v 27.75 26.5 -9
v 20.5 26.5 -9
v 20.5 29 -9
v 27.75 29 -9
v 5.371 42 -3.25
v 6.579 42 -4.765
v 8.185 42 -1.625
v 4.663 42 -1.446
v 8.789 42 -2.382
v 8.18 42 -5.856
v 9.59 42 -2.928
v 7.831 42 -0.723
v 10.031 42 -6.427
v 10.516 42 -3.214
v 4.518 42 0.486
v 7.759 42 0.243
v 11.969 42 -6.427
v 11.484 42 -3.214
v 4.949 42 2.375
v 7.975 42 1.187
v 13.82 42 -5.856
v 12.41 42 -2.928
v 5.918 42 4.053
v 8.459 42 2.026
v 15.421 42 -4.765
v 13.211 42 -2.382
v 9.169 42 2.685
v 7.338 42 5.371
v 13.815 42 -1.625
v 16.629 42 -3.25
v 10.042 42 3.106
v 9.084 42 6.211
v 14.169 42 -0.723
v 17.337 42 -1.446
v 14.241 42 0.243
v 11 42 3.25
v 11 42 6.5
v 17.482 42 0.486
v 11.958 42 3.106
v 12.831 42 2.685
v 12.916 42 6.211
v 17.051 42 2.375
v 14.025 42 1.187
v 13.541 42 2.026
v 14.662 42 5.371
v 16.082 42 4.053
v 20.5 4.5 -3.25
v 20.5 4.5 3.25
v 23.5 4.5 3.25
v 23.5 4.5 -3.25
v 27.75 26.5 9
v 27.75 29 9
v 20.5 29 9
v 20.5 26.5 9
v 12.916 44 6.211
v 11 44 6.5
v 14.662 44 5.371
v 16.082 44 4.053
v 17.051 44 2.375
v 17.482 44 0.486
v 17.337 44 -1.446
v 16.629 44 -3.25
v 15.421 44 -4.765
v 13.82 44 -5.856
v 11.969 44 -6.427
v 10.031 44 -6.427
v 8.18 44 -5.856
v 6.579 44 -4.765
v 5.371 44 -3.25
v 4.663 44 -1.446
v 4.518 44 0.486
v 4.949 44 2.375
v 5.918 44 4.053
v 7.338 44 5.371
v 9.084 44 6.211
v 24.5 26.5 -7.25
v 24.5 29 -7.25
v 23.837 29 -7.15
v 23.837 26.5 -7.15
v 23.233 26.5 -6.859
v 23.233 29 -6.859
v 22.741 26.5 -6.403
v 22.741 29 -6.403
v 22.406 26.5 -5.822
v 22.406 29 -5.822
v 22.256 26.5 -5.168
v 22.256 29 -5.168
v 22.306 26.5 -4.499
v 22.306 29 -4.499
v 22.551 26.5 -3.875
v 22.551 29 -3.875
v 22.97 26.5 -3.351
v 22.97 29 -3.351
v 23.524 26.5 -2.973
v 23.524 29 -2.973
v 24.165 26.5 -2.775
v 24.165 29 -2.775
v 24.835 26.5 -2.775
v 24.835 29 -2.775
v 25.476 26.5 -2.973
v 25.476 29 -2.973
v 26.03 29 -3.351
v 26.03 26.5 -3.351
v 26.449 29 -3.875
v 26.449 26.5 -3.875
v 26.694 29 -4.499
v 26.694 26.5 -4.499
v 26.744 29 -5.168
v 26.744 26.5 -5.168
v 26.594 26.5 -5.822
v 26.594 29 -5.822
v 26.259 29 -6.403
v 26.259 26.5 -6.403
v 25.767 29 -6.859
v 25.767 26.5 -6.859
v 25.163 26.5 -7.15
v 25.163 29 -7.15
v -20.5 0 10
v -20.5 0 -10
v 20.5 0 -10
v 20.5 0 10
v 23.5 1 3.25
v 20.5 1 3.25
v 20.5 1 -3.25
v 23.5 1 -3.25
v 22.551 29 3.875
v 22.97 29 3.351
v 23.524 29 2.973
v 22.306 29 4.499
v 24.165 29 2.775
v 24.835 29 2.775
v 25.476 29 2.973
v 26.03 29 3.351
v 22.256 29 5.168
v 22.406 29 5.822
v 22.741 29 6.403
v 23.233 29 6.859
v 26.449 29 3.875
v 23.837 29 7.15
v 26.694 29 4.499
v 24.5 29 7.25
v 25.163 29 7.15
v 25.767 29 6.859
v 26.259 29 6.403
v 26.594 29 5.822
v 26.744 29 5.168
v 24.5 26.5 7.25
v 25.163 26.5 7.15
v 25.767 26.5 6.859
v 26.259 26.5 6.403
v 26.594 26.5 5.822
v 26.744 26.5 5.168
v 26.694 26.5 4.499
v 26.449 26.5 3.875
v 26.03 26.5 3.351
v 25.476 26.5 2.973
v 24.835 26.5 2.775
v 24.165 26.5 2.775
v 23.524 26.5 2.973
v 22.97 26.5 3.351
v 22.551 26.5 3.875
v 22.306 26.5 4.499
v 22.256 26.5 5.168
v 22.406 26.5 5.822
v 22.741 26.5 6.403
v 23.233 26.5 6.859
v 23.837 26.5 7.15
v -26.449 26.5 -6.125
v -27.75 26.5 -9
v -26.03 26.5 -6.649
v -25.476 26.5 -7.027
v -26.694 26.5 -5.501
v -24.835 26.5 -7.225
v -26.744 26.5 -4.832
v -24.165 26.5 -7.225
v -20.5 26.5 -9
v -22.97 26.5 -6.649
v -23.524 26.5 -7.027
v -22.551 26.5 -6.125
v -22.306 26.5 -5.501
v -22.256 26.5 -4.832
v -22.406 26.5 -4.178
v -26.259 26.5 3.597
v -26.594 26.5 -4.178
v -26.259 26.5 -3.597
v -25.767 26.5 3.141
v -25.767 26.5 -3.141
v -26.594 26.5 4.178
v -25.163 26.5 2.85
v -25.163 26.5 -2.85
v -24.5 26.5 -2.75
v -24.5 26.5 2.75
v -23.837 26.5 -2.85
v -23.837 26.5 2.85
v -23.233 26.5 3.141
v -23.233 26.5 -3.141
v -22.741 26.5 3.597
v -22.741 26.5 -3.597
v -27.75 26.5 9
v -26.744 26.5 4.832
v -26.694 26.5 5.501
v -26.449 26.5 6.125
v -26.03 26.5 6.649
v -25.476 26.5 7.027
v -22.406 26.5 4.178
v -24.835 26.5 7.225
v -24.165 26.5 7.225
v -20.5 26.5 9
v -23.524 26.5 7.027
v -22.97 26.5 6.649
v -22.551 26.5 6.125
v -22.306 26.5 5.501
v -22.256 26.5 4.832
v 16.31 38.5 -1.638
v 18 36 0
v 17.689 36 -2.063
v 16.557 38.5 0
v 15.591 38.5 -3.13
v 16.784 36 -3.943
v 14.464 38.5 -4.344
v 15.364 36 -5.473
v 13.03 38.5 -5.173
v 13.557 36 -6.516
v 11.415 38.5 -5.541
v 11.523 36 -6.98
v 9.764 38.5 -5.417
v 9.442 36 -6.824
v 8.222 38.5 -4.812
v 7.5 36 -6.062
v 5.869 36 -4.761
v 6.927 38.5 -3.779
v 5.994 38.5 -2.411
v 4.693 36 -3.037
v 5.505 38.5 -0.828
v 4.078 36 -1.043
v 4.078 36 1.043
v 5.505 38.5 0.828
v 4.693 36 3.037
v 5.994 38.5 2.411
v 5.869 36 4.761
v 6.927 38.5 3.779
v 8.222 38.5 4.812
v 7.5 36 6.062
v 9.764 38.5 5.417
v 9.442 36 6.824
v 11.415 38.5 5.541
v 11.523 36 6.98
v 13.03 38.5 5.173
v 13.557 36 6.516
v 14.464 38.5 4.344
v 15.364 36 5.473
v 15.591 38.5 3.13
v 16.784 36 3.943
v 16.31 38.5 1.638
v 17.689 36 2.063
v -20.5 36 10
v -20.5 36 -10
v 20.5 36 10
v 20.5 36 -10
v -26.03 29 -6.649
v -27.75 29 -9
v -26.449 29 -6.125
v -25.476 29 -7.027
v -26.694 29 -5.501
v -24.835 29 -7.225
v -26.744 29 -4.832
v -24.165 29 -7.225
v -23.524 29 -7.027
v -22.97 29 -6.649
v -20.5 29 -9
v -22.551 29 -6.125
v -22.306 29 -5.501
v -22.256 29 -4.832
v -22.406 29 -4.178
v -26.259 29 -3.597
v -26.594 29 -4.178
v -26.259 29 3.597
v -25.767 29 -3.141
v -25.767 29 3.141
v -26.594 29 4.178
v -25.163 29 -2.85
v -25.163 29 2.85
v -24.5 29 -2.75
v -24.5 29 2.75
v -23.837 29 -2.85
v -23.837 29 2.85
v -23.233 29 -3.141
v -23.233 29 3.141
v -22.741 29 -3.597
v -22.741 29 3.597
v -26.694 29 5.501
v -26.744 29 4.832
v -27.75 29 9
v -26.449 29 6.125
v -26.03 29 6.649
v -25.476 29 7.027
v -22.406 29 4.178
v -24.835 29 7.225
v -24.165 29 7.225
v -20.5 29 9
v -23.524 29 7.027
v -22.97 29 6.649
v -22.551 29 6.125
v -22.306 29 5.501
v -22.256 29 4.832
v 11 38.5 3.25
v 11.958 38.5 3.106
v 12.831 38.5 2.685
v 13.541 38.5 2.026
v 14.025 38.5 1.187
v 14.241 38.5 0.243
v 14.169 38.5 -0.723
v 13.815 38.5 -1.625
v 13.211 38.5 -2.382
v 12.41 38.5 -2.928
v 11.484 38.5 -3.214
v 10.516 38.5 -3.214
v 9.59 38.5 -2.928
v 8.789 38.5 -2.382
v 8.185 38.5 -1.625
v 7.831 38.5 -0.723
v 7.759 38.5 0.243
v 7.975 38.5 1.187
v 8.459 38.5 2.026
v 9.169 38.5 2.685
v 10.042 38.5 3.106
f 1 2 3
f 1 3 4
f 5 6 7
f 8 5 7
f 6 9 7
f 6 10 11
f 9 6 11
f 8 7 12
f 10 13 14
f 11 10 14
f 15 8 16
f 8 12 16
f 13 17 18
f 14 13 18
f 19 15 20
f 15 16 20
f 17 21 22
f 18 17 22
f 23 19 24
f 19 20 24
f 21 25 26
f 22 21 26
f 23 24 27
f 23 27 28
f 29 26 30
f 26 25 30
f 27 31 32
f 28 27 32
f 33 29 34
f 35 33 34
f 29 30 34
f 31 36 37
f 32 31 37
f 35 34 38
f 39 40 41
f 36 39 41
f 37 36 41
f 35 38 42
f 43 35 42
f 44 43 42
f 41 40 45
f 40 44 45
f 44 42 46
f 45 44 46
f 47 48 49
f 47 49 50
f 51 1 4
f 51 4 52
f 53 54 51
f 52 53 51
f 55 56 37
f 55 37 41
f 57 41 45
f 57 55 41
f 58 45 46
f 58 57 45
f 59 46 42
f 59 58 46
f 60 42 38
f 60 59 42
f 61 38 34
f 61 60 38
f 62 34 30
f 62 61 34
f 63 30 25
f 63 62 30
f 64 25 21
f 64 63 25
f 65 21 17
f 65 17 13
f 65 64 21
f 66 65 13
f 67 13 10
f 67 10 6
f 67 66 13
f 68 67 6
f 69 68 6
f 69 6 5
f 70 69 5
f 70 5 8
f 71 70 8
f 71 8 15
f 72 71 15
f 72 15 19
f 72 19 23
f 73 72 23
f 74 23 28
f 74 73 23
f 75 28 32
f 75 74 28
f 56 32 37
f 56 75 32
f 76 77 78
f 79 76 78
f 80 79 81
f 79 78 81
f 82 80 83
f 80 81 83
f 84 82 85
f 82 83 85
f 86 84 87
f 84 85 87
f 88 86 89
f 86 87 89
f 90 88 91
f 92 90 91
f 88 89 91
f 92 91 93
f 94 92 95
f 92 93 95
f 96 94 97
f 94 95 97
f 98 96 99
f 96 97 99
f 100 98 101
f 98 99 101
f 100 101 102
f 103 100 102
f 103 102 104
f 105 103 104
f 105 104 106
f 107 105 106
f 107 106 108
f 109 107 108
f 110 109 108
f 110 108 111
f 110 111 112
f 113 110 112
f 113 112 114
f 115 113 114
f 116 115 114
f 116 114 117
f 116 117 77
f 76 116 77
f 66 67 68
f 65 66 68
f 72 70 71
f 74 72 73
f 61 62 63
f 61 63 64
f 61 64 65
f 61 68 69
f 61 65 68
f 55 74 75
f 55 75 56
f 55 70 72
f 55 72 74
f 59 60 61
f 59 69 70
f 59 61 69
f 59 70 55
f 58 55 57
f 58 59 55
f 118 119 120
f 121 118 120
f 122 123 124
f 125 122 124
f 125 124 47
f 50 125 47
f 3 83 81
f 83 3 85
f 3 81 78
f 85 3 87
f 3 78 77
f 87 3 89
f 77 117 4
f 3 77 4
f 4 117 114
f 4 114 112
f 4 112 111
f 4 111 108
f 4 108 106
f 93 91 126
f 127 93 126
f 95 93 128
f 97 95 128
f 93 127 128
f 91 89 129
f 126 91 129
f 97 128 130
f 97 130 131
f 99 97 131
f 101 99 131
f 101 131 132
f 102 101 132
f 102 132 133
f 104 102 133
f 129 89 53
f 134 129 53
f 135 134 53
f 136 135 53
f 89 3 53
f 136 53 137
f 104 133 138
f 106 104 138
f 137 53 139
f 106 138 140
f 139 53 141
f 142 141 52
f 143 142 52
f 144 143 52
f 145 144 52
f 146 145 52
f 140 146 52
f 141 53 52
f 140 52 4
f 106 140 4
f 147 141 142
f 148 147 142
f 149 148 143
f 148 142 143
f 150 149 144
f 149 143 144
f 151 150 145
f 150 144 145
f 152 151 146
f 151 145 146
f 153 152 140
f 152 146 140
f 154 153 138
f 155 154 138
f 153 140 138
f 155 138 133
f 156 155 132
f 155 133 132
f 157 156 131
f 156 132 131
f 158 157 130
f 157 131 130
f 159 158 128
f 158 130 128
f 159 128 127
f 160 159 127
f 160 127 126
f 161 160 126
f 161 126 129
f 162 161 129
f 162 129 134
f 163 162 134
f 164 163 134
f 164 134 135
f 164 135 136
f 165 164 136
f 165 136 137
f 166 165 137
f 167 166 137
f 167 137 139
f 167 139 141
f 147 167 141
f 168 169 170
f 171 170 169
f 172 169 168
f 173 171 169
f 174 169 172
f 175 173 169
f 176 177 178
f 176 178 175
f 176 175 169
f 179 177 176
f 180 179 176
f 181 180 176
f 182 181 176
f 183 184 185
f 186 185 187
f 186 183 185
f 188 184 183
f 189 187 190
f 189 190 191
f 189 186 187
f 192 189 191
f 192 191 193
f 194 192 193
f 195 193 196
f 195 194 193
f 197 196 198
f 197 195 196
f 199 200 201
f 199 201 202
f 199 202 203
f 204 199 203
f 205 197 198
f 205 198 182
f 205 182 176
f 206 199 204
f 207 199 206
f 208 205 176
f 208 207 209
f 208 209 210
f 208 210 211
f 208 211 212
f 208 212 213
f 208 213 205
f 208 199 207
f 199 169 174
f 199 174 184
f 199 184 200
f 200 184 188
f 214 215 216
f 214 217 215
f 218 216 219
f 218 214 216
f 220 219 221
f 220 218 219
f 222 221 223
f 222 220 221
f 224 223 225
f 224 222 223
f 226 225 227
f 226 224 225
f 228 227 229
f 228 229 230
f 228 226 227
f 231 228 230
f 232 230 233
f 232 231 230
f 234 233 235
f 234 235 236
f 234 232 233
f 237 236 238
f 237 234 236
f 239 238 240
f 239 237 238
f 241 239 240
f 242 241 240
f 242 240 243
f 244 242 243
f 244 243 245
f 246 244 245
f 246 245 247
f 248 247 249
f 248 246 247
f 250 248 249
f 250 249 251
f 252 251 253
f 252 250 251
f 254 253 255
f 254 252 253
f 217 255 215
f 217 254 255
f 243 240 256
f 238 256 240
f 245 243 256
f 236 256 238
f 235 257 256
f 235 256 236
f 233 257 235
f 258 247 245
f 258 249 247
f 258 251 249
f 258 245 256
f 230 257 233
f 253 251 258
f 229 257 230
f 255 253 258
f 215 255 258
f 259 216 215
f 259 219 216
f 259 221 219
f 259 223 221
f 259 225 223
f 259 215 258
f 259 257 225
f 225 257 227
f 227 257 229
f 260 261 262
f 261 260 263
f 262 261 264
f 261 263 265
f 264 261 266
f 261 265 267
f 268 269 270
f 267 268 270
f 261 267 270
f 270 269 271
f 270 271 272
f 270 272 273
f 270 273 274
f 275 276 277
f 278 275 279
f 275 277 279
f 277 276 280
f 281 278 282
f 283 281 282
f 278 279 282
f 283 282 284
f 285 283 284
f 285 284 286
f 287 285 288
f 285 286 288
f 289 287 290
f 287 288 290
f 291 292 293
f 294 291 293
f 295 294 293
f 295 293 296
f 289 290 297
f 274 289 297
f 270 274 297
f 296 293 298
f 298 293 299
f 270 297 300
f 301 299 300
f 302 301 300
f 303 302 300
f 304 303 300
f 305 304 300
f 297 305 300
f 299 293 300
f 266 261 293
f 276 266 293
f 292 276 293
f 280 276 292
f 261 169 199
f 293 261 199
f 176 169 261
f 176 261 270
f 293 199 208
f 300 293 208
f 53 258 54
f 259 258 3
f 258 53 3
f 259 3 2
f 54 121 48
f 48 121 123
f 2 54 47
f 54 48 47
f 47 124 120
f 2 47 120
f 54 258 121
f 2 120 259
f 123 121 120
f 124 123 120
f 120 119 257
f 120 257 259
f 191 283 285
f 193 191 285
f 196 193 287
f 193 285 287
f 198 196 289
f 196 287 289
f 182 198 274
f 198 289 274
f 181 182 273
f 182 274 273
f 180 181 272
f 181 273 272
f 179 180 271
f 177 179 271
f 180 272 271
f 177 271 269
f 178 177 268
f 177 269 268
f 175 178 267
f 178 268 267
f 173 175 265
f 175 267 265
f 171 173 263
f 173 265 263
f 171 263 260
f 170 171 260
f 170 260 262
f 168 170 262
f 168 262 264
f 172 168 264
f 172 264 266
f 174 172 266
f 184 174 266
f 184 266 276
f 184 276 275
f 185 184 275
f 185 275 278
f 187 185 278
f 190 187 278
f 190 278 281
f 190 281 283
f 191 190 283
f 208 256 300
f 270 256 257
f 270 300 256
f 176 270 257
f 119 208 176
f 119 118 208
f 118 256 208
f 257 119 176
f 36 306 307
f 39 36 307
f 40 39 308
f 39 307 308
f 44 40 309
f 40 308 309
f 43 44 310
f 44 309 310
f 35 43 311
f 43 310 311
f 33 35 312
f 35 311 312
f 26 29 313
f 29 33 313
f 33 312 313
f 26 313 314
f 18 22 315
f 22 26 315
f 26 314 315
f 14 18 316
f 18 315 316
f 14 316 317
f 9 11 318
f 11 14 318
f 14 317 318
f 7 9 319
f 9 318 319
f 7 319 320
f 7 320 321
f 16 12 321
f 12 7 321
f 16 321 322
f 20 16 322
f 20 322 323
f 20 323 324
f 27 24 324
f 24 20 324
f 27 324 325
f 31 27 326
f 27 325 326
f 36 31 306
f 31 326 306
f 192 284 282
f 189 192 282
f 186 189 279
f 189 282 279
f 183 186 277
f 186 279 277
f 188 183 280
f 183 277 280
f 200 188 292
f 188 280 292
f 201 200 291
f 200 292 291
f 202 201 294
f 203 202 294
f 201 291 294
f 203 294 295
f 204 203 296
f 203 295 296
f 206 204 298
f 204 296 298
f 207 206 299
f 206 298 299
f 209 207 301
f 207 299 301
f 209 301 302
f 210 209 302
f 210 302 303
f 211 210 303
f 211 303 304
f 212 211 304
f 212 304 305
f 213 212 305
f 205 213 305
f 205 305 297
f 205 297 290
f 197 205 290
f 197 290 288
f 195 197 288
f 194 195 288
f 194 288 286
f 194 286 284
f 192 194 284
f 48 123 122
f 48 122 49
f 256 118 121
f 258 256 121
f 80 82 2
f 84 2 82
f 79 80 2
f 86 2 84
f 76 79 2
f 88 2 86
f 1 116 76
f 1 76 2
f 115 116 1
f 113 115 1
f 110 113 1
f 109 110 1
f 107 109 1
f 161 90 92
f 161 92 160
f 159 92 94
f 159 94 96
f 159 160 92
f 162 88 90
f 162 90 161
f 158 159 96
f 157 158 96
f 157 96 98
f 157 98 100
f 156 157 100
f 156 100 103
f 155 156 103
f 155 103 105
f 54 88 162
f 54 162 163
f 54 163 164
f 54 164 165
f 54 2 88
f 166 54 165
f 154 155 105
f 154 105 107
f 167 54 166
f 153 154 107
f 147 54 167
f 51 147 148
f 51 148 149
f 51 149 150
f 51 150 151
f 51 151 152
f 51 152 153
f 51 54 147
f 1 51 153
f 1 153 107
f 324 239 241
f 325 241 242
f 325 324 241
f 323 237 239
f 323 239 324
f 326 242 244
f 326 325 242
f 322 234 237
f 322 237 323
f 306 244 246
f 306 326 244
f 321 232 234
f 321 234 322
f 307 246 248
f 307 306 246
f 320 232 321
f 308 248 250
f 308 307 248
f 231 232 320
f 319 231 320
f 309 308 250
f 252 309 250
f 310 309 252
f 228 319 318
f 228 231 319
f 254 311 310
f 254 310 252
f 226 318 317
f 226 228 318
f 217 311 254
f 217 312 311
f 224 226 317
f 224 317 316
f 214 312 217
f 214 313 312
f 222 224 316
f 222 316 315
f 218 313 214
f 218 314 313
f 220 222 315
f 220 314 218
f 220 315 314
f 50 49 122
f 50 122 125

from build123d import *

# Parameters (mm, degrees)
SKETCH1_W           = 41
SKETCH1_H           = 20
BOSS_EXTRUDE1_DEPTH = 36
BOSS_EXTRUDE2_START = -26.5
SKETCH2_W           = 55.5
SKETCH2_H           = 18
BOSS_EXTRUDE2_DEPTH = 2.5
SKETCH3_W           = 6.5
SKETCH3_H           = 3.5
BOSS_EXTRUDE3_DEPTH = 3
SKETCH4_R           = 7
BOSS_EXTRUDE4_DEPTH = 2.5
BOSS_EXTRUDE4_TAPER = 30
SKETCH5_R           = 3.25
BOSS_EXTRUDE6_DEPTH = 8
SKETCH6_R           = 6.5
BOSS_EXTRUDE7_DEPTH = 2
SKETCH9_R           = 2.25
CUT_EXTRUDE1_DEPTH  = 10


with BuildPart() as part:
    # Sketch1 → Boss-Extrude1 (new body)
    with BuildSketch(Plane(origin=(0, 0, 0), x_dir=(1, 0, 0), z_dir=(0, 1, 0))):
        Rectangle(SKETCH1_W, SKETCH1_H)
    extrude(amount=BOSS_EXTRUDE1_DEPTH)

    # Sketch2 → Boss-Extrude2 (add)
    with BuildSketch(Plane.XZ.offset(BOSS_EXTRUDE2_START)):
        Rectangle(SKETCH2_W, SKETCH2_H)
    extrude(amount=-BOSS_EXTRUDE2_DEPTH)

    # Sketch3 → Boss-Extrude3 (add)
    with BuildSketch(Plane(origin=(20.5, 0, 0), x_dir=(0, 0, -1), z_dir=(1, 0, 0))):
        with Locations((0, 2.75)):
            Rectangle(SKETCH3_W, SKETCH3_H)
    extrude(amount=BOSS_EXTRUDE3_DEPTH)

    # Sketch4 → Boss-Extrude4 (add)
    with BuildSketch(Plane(origin=(0, 36, 0), x_dir=(1, 0, 0), z_dir=(0, 1, 0))):
        with Locations((11, 0)):
            Circle(SKETCH4_R)
    extrude(amount=BOSS_EXTRUDE4_DEPTH, taper=BOSS_EXTRUDE4_TAPER)

    # Sketch5 → Boss-Extrude6 (add)
    with BuildSketch(Plane(origin=(0, 36, 0), x_dir=(1, 0, 0), z_dir=(0, 1, 0))):
        with Locations(Location((11, 0, 0), (0, 0, 270))):
            Circle(SKETCH5_R)
    extrude(amount=BOSS_EXTRUDE6_DEPTH)

    # Sketch6 → Boss-Extrude7 (add)
    with BuildSketch(Plane(origin=(0, 44, 0), x_dir=(1, 0, 0), z_dir=(0, 1, 0))):
        with Locations(Location((11, 0, 0), (0, 0, 270))):
            Circle(SKETCH6_R)
    extrude(amount=-BOSS_EXTRUDE7_DEPTH)

    # Sketch9 → Cut-Extrude1 (cut)
    with BuildSketch(Plane(origin=(0, 29, 0), x_dir=(1, 0, 0), z_dir=(0, 1, 0))):
        with Locations(Location((-24.5, 5, 0), (0, 0, 270))):
            Circle(SKETCH9_R)
        with Locations(Location((24.5, 5, 0), (0, 0, 90))):
            Circle(SKETCH9_R)
        with Locations(Location((-24.5, -5, 0), (0, 0, 90))):
            Circle(SKETCH9_R)
        with Locations(Location((24.5, -5, 0), (0, 0, 270))):
            Circle(SKETCH9_R)
    extrude(amount=-CUT_EXTRUDE1_DEPTH, mode=Mode.SUBTRACT)


solid = part.part
